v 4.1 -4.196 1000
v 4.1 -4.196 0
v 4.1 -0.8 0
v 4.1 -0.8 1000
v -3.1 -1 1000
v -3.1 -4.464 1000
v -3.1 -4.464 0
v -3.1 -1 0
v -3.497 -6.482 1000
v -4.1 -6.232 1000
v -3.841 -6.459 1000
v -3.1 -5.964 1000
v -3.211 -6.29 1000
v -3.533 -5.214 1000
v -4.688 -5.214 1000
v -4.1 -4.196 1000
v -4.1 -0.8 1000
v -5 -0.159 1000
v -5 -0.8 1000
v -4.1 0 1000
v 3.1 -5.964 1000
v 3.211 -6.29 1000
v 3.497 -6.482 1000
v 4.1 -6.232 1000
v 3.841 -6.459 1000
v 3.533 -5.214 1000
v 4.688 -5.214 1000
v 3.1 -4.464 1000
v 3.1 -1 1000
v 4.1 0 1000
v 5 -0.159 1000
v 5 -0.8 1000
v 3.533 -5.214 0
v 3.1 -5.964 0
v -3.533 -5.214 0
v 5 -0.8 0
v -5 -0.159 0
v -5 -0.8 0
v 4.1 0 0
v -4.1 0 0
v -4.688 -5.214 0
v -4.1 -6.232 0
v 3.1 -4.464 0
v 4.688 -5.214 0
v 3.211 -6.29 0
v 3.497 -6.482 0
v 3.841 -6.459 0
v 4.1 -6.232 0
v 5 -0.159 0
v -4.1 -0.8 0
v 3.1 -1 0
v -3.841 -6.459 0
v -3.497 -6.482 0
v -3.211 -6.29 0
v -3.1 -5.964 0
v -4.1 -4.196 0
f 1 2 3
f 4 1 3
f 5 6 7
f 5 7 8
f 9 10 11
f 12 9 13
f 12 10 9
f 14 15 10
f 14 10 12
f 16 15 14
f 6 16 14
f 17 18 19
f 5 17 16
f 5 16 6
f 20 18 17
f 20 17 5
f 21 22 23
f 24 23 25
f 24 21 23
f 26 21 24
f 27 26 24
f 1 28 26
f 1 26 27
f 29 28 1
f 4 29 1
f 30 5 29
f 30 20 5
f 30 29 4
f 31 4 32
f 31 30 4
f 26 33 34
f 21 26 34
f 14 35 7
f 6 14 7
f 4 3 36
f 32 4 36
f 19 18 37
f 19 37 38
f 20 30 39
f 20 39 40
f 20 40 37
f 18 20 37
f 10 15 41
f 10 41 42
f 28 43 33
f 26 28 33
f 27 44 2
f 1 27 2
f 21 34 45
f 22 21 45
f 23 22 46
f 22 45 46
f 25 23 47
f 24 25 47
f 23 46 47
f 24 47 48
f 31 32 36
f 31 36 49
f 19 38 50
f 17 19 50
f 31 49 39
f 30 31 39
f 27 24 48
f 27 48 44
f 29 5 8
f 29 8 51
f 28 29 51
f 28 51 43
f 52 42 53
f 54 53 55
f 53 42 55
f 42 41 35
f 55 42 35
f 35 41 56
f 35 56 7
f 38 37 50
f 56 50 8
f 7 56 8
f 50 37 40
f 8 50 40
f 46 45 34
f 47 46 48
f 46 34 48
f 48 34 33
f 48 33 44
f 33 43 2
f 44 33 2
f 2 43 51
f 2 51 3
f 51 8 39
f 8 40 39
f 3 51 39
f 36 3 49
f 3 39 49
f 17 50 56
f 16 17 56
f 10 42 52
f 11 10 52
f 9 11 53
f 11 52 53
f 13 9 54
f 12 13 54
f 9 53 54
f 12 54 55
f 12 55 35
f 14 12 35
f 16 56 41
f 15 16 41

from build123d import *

# Parameters (mm, degrees)
EXTRUDE_1_DEPTH = 1000


with BuildPart() as part:
    # Эскиз1 → Бобышка-Вытянуть1 (new body)
    with BuildSketch(Plane.XY):
        with BuildLine():
            Line((-4.1, 0), (-5, -0.158694283))
            Line((-5, -0.158694283), (-5, -0.8))
            Line((-5, -0.8), (-4.1, -0.8))
            Line((-4.1, -0.8), (-4.1, -4.196152423))
            Line((-4.1, -4.196152423), (-4.68771324, -5.214101615))
            Line((-4.68771324, -5.214101615), (-4.1, -6.232050808))
            ThreePointArc((-4.1, -6.232050808), (-3.497197677, -6.481739705), (-3.1, -5.964101615))
            Line((-3.1, -5.964101615), (-3.533012702, -5.214101615))
            Line((-3.533012702, -5.214101615), (-3.1, -4.464101615))
            Line((-3.1, -4.464101615), (-3.1, -1))
            Line((-3.1, -1), (3.1, -1))
            Line((3.1, -1), (3.1, -4.464101615))
            Line((3.1, -4.464101615), (3.533012702, -5.214101615))
            Line((3.533012702, -5.214101615), (3.1, -5.964101615))
            ThreePointArc((3.1, -5.964101615), (3.497197677, -6.481739705), (4.1, -6.232050808))
            Line((4.1, -6.232050808), (4.68771324, -5.214101615))
            Line((4.68771324, -5.214101615), (4.1, -4.196152423))
            Line((4.1, -4.196152423), (4.1, -0.8))
            Line((4.1, -0.8), (5, -0.8))
            Line((5, -0.8), (5, -0.158694283))
            Line((5, -0.158694283), (4.1, 0))
            Line((4.1, 0), (-4.1, 0))
        make_face()
    extrude(amount=EXTRUDE_1_DEPTH)


solid = part.part
